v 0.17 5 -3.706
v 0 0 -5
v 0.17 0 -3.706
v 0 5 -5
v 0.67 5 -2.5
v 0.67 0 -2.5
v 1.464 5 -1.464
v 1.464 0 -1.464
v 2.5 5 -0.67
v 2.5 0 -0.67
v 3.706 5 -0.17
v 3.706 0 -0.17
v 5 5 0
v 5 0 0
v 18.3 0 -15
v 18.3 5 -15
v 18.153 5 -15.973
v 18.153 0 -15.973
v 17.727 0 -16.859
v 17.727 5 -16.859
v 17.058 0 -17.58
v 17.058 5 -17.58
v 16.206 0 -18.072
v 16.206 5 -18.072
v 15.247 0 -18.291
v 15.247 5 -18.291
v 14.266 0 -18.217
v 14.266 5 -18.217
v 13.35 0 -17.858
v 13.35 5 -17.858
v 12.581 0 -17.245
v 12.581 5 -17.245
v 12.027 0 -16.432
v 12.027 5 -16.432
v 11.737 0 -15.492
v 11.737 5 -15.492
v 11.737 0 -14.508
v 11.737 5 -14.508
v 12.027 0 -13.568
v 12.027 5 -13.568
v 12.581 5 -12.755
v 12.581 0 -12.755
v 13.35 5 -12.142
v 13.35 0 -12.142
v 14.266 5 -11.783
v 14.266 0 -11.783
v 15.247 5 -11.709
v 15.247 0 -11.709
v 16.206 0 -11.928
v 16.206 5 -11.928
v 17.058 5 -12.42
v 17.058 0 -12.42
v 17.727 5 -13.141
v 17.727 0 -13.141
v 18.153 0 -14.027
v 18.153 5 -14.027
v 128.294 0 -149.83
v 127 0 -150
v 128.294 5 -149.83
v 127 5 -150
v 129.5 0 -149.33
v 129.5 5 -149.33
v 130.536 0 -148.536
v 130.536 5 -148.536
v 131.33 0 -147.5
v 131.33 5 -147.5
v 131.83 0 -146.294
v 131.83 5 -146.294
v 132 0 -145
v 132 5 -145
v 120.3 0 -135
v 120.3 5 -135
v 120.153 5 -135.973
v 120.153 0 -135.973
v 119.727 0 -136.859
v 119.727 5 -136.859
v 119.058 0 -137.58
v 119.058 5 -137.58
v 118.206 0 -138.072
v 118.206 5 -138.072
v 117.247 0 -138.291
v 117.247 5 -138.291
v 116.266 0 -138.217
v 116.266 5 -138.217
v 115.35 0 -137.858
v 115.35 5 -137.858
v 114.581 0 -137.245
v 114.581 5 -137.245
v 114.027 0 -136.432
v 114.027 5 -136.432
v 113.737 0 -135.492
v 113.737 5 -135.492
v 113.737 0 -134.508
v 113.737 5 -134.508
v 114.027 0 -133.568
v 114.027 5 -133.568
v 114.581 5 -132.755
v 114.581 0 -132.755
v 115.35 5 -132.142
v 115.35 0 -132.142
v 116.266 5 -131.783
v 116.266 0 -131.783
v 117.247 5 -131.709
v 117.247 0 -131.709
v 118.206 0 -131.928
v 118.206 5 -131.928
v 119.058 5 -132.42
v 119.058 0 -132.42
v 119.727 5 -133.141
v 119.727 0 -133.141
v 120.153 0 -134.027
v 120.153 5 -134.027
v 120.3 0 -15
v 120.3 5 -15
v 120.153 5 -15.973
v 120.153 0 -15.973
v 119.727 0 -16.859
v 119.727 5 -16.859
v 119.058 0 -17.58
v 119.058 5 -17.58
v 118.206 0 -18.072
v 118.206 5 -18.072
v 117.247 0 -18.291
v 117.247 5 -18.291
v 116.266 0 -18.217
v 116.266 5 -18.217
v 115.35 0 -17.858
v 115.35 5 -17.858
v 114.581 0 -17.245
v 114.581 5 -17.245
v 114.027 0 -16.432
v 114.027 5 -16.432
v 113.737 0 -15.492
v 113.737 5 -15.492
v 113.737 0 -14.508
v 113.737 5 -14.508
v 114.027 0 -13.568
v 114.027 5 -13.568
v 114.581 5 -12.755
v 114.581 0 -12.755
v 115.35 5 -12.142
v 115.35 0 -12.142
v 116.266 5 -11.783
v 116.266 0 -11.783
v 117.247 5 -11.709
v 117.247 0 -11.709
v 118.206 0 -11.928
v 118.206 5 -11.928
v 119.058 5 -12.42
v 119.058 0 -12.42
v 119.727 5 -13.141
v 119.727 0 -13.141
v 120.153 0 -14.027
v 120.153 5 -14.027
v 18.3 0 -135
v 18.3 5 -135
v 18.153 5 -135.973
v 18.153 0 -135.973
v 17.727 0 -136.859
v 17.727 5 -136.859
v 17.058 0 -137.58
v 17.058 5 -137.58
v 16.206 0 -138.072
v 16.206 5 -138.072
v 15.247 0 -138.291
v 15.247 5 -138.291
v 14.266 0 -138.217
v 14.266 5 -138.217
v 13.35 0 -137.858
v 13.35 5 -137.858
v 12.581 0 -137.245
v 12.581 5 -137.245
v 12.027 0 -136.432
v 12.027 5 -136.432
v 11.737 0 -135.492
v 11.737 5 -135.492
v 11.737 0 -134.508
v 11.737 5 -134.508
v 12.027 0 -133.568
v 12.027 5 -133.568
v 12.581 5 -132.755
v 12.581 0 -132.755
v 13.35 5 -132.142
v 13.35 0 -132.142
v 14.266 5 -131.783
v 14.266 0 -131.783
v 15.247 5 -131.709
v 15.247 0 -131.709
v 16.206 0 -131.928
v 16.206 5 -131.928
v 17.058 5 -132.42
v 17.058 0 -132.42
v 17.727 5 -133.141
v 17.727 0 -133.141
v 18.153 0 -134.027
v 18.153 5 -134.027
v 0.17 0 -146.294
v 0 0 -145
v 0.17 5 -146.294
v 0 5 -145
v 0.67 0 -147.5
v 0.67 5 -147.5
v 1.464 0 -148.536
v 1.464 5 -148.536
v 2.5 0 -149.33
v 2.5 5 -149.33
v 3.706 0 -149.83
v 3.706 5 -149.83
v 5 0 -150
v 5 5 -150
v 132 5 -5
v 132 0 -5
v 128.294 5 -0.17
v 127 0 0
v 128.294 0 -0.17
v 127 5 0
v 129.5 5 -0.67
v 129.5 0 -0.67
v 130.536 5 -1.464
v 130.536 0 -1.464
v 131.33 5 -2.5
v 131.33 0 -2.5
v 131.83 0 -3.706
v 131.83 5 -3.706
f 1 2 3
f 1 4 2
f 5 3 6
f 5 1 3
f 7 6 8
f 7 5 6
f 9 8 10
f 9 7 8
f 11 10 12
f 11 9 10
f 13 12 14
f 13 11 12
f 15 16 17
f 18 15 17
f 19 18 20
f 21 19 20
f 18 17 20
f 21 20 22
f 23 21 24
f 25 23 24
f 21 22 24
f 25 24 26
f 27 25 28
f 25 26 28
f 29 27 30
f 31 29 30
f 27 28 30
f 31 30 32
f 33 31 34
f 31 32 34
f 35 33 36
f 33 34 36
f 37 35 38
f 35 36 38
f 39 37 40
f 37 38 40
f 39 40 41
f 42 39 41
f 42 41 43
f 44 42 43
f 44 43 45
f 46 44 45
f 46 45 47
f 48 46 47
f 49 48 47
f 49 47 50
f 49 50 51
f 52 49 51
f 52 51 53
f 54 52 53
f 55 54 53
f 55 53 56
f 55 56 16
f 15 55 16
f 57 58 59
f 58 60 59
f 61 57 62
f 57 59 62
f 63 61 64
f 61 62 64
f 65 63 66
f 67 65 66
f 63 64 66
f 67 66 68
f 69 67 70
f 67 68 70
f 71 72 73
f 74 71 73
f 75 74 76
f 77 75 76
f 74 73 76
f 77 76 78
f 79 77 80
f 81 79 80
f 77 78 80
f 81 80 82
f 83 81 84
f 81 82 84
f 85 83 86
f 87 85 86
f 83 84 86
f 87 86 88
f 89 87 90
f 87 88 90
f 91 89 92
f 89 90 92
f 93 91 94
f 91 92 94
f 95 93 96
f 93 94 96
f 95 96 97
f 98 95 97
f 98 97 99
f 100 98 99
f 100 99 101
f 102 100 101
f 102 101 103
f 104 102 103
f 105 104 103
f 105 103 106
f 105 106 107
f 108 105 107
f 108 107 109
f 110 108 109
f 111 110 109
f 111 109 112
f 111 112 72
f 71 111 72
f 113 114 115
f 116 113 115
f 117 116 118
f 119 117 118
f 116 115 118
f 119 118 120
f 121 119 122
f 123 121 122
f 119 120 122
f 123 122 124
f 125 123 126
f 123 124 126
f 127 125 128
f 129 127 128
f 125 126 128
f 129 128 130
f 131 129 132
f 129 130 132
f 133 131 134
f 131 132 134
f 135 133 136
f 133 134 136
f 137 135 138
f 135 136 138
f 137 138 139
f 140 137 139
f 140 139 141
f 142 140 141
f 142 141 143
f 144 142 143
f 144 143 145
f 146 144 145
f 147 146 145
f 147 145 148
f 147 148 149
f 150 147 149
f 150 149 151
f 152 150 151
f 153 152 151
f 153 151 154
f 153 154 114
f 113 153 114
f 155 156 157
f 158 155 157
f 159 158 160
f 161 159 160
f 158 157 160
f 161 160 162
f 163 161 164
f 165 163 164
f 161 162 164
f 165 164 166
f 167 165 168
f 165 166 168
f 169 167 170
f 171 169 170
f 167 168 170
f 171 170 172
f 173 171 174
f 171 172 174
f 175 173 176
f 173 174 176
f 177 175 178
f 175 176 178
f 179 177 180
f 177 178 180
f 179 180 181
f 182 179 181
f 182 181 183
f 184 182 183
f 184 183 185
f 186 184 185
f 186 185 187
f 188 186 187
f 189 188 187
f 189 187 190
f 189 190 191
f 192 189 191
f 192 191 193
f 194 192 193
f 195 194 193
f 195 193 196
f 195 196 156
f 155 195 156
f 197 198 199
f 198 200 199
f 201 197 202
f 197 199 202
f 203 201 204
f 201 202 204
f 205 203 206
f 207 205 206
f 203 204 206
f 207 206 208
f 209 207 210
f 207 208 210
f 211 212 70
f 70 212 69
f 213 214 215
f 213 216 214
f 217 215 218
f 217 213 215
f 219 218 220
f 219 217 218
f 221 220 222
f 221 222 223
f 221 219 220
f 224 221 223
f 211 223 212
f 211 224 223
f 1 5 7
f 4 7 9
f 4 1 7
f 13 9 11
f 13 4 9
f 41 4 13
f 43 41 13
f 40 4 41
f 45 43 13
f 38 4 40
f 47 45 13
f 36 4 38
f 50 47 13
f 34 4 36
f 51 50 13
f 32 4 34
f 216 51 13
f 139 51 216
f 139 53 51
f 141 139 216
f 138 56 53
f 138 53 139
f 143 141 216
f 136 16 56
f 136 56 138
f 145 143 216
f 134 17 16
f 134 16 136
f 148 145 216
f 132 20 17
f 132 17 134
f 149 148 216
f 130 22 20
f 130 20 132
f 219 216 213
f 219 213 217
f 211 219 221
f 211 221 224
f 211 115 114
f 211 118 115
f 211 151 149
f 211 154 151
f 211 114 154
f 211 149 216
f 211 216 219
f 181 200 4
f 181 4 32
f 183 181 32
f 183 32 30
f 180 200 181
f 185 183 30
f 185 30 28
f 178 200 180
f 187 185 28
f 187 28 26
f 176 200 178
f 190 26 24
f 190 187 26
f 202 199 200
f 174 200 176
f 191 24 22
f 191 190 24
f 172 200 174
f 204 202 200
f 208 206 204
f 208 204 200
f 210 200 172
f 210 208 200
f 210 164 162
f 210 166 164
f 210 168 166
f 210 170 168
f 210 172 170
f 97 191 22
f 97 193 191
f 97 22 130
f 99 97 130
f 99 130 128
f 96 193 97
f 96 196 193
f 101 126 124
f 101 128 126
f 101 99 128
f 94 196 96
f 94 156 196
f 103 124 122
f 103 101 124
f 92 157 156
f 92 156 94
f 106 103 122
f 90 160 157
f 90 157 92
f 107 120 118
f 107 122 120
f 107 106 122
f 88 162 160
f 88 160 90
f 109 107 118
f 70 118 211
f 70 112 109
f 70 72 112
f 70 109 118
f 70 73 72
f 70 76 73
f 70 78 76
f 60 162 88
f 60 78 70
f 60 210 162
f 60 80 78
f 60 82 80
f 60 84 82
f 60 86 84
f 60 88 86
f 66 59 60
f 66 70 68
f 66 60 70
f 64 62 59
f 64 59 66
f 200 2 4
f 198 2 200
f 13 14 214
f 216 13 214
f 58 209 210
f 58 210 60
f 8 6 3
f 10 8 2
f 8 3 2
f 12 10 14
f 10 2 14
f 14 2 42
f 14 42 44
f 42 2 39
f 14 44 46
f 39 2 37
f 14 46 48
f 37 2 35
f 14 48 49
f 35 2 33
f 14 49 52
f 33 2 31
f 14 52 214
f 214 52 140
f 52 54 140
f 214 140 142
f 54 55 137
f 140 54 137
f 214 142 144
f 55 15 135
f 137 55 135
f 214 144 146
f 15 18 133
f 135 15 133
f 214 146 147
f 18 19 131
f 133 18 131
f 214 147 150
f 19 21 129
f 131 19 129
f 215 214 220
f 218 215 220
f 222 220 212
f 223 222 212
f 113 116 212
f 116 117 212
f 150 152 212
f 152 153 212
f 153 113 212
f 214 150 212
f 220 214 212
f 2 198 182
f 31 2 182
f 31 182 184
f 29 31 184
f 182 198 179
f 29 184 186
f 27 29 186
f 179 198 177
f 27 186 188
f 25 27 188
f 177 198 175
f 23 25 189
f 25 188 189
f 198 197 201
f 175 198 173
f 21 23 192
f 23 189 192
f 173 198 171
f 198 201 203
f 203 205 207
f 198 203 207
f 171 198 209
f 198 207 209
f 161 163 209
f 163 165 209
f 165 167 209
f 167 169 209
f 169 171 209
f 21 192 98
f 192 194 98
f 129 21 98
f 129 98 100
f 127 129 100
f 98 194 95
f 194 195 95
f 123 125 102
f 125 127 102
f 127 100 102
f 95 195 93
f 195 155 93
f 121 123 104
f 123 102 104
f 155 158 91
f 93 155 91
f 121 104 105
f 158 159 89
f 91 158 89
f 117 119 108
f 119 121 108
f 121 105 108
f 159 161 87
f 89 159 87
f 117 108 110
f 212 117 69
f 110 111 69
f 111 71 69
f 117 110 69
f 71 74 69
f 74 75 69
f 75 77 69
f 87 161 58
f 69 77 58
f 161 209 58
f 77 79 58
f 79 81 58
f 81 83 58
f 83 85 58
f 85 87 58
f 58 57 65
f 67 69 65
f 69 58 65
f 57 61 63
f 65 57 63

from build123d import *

# Parameters (mm, degrees)
SKETCH1_W                = 132
SKETCH1_H                = 150
BOSS_EXTRUDE1_DEPTH      = 5
M6_CLEARANCE_HOLE1_D     = 6.6
M6_CLEARANCE_HOLE1_DEPTH = 10
M6_CLEARANCE_HOLE1_TIP   = 1.982840043
FILLET1_R                = 5


with BuildPart() as part:
    # Sketch1 → Boss-Extrude1 (new body)
    with BuildSketch(Plane(origin=(0, 0, 0), x_dir=(1, 0, 0), z_dir=(0, 1, 0))):
        with Locations((66, 75)):
            Rectangle(SKETCH1_W, SKETCH1_H)
    extrude(amount=BOSS_EXTRUDE1_DEPTH)

    # M6 Clearance Hole1
    with Locations(Plane(origin=(0, 0, 0), x_dir=(-1, 0, 0), z_dir=(0, -1, 0))):
        with Locations((-15, 15), (-117, 15), (-117, 135), (-15, 135)):
            Hole(M6_CLEARANCE_HOLE1_D / 2, depth=M6_CLEARANCE_HOLE1_DEPTH)
            with Locations((0, 0, -(M6_CLEARANCE_HOLE1_DEPTH + M6_CLEARANCE_HOLE1_TIP / 2))):  # 118° drill point
                Cone(0, M6_CLEARANCE_HOLE1_D / 2, M6_CLEARANCE_HOLE1_TIP, mode=Mode.SUBTRACT)

    # Fillet1
    fillet1_edges = [part.edges().sort_by_distance(p)[0] for p in [
        (0, 2.5, -150),
        (132, 2.5, -150),
        (132, 2.5, 0),
        (0, 2.5, 0),
    ]]
    fillet(fillet1_edges, radius=FILLET1_R)


solid = part.part
